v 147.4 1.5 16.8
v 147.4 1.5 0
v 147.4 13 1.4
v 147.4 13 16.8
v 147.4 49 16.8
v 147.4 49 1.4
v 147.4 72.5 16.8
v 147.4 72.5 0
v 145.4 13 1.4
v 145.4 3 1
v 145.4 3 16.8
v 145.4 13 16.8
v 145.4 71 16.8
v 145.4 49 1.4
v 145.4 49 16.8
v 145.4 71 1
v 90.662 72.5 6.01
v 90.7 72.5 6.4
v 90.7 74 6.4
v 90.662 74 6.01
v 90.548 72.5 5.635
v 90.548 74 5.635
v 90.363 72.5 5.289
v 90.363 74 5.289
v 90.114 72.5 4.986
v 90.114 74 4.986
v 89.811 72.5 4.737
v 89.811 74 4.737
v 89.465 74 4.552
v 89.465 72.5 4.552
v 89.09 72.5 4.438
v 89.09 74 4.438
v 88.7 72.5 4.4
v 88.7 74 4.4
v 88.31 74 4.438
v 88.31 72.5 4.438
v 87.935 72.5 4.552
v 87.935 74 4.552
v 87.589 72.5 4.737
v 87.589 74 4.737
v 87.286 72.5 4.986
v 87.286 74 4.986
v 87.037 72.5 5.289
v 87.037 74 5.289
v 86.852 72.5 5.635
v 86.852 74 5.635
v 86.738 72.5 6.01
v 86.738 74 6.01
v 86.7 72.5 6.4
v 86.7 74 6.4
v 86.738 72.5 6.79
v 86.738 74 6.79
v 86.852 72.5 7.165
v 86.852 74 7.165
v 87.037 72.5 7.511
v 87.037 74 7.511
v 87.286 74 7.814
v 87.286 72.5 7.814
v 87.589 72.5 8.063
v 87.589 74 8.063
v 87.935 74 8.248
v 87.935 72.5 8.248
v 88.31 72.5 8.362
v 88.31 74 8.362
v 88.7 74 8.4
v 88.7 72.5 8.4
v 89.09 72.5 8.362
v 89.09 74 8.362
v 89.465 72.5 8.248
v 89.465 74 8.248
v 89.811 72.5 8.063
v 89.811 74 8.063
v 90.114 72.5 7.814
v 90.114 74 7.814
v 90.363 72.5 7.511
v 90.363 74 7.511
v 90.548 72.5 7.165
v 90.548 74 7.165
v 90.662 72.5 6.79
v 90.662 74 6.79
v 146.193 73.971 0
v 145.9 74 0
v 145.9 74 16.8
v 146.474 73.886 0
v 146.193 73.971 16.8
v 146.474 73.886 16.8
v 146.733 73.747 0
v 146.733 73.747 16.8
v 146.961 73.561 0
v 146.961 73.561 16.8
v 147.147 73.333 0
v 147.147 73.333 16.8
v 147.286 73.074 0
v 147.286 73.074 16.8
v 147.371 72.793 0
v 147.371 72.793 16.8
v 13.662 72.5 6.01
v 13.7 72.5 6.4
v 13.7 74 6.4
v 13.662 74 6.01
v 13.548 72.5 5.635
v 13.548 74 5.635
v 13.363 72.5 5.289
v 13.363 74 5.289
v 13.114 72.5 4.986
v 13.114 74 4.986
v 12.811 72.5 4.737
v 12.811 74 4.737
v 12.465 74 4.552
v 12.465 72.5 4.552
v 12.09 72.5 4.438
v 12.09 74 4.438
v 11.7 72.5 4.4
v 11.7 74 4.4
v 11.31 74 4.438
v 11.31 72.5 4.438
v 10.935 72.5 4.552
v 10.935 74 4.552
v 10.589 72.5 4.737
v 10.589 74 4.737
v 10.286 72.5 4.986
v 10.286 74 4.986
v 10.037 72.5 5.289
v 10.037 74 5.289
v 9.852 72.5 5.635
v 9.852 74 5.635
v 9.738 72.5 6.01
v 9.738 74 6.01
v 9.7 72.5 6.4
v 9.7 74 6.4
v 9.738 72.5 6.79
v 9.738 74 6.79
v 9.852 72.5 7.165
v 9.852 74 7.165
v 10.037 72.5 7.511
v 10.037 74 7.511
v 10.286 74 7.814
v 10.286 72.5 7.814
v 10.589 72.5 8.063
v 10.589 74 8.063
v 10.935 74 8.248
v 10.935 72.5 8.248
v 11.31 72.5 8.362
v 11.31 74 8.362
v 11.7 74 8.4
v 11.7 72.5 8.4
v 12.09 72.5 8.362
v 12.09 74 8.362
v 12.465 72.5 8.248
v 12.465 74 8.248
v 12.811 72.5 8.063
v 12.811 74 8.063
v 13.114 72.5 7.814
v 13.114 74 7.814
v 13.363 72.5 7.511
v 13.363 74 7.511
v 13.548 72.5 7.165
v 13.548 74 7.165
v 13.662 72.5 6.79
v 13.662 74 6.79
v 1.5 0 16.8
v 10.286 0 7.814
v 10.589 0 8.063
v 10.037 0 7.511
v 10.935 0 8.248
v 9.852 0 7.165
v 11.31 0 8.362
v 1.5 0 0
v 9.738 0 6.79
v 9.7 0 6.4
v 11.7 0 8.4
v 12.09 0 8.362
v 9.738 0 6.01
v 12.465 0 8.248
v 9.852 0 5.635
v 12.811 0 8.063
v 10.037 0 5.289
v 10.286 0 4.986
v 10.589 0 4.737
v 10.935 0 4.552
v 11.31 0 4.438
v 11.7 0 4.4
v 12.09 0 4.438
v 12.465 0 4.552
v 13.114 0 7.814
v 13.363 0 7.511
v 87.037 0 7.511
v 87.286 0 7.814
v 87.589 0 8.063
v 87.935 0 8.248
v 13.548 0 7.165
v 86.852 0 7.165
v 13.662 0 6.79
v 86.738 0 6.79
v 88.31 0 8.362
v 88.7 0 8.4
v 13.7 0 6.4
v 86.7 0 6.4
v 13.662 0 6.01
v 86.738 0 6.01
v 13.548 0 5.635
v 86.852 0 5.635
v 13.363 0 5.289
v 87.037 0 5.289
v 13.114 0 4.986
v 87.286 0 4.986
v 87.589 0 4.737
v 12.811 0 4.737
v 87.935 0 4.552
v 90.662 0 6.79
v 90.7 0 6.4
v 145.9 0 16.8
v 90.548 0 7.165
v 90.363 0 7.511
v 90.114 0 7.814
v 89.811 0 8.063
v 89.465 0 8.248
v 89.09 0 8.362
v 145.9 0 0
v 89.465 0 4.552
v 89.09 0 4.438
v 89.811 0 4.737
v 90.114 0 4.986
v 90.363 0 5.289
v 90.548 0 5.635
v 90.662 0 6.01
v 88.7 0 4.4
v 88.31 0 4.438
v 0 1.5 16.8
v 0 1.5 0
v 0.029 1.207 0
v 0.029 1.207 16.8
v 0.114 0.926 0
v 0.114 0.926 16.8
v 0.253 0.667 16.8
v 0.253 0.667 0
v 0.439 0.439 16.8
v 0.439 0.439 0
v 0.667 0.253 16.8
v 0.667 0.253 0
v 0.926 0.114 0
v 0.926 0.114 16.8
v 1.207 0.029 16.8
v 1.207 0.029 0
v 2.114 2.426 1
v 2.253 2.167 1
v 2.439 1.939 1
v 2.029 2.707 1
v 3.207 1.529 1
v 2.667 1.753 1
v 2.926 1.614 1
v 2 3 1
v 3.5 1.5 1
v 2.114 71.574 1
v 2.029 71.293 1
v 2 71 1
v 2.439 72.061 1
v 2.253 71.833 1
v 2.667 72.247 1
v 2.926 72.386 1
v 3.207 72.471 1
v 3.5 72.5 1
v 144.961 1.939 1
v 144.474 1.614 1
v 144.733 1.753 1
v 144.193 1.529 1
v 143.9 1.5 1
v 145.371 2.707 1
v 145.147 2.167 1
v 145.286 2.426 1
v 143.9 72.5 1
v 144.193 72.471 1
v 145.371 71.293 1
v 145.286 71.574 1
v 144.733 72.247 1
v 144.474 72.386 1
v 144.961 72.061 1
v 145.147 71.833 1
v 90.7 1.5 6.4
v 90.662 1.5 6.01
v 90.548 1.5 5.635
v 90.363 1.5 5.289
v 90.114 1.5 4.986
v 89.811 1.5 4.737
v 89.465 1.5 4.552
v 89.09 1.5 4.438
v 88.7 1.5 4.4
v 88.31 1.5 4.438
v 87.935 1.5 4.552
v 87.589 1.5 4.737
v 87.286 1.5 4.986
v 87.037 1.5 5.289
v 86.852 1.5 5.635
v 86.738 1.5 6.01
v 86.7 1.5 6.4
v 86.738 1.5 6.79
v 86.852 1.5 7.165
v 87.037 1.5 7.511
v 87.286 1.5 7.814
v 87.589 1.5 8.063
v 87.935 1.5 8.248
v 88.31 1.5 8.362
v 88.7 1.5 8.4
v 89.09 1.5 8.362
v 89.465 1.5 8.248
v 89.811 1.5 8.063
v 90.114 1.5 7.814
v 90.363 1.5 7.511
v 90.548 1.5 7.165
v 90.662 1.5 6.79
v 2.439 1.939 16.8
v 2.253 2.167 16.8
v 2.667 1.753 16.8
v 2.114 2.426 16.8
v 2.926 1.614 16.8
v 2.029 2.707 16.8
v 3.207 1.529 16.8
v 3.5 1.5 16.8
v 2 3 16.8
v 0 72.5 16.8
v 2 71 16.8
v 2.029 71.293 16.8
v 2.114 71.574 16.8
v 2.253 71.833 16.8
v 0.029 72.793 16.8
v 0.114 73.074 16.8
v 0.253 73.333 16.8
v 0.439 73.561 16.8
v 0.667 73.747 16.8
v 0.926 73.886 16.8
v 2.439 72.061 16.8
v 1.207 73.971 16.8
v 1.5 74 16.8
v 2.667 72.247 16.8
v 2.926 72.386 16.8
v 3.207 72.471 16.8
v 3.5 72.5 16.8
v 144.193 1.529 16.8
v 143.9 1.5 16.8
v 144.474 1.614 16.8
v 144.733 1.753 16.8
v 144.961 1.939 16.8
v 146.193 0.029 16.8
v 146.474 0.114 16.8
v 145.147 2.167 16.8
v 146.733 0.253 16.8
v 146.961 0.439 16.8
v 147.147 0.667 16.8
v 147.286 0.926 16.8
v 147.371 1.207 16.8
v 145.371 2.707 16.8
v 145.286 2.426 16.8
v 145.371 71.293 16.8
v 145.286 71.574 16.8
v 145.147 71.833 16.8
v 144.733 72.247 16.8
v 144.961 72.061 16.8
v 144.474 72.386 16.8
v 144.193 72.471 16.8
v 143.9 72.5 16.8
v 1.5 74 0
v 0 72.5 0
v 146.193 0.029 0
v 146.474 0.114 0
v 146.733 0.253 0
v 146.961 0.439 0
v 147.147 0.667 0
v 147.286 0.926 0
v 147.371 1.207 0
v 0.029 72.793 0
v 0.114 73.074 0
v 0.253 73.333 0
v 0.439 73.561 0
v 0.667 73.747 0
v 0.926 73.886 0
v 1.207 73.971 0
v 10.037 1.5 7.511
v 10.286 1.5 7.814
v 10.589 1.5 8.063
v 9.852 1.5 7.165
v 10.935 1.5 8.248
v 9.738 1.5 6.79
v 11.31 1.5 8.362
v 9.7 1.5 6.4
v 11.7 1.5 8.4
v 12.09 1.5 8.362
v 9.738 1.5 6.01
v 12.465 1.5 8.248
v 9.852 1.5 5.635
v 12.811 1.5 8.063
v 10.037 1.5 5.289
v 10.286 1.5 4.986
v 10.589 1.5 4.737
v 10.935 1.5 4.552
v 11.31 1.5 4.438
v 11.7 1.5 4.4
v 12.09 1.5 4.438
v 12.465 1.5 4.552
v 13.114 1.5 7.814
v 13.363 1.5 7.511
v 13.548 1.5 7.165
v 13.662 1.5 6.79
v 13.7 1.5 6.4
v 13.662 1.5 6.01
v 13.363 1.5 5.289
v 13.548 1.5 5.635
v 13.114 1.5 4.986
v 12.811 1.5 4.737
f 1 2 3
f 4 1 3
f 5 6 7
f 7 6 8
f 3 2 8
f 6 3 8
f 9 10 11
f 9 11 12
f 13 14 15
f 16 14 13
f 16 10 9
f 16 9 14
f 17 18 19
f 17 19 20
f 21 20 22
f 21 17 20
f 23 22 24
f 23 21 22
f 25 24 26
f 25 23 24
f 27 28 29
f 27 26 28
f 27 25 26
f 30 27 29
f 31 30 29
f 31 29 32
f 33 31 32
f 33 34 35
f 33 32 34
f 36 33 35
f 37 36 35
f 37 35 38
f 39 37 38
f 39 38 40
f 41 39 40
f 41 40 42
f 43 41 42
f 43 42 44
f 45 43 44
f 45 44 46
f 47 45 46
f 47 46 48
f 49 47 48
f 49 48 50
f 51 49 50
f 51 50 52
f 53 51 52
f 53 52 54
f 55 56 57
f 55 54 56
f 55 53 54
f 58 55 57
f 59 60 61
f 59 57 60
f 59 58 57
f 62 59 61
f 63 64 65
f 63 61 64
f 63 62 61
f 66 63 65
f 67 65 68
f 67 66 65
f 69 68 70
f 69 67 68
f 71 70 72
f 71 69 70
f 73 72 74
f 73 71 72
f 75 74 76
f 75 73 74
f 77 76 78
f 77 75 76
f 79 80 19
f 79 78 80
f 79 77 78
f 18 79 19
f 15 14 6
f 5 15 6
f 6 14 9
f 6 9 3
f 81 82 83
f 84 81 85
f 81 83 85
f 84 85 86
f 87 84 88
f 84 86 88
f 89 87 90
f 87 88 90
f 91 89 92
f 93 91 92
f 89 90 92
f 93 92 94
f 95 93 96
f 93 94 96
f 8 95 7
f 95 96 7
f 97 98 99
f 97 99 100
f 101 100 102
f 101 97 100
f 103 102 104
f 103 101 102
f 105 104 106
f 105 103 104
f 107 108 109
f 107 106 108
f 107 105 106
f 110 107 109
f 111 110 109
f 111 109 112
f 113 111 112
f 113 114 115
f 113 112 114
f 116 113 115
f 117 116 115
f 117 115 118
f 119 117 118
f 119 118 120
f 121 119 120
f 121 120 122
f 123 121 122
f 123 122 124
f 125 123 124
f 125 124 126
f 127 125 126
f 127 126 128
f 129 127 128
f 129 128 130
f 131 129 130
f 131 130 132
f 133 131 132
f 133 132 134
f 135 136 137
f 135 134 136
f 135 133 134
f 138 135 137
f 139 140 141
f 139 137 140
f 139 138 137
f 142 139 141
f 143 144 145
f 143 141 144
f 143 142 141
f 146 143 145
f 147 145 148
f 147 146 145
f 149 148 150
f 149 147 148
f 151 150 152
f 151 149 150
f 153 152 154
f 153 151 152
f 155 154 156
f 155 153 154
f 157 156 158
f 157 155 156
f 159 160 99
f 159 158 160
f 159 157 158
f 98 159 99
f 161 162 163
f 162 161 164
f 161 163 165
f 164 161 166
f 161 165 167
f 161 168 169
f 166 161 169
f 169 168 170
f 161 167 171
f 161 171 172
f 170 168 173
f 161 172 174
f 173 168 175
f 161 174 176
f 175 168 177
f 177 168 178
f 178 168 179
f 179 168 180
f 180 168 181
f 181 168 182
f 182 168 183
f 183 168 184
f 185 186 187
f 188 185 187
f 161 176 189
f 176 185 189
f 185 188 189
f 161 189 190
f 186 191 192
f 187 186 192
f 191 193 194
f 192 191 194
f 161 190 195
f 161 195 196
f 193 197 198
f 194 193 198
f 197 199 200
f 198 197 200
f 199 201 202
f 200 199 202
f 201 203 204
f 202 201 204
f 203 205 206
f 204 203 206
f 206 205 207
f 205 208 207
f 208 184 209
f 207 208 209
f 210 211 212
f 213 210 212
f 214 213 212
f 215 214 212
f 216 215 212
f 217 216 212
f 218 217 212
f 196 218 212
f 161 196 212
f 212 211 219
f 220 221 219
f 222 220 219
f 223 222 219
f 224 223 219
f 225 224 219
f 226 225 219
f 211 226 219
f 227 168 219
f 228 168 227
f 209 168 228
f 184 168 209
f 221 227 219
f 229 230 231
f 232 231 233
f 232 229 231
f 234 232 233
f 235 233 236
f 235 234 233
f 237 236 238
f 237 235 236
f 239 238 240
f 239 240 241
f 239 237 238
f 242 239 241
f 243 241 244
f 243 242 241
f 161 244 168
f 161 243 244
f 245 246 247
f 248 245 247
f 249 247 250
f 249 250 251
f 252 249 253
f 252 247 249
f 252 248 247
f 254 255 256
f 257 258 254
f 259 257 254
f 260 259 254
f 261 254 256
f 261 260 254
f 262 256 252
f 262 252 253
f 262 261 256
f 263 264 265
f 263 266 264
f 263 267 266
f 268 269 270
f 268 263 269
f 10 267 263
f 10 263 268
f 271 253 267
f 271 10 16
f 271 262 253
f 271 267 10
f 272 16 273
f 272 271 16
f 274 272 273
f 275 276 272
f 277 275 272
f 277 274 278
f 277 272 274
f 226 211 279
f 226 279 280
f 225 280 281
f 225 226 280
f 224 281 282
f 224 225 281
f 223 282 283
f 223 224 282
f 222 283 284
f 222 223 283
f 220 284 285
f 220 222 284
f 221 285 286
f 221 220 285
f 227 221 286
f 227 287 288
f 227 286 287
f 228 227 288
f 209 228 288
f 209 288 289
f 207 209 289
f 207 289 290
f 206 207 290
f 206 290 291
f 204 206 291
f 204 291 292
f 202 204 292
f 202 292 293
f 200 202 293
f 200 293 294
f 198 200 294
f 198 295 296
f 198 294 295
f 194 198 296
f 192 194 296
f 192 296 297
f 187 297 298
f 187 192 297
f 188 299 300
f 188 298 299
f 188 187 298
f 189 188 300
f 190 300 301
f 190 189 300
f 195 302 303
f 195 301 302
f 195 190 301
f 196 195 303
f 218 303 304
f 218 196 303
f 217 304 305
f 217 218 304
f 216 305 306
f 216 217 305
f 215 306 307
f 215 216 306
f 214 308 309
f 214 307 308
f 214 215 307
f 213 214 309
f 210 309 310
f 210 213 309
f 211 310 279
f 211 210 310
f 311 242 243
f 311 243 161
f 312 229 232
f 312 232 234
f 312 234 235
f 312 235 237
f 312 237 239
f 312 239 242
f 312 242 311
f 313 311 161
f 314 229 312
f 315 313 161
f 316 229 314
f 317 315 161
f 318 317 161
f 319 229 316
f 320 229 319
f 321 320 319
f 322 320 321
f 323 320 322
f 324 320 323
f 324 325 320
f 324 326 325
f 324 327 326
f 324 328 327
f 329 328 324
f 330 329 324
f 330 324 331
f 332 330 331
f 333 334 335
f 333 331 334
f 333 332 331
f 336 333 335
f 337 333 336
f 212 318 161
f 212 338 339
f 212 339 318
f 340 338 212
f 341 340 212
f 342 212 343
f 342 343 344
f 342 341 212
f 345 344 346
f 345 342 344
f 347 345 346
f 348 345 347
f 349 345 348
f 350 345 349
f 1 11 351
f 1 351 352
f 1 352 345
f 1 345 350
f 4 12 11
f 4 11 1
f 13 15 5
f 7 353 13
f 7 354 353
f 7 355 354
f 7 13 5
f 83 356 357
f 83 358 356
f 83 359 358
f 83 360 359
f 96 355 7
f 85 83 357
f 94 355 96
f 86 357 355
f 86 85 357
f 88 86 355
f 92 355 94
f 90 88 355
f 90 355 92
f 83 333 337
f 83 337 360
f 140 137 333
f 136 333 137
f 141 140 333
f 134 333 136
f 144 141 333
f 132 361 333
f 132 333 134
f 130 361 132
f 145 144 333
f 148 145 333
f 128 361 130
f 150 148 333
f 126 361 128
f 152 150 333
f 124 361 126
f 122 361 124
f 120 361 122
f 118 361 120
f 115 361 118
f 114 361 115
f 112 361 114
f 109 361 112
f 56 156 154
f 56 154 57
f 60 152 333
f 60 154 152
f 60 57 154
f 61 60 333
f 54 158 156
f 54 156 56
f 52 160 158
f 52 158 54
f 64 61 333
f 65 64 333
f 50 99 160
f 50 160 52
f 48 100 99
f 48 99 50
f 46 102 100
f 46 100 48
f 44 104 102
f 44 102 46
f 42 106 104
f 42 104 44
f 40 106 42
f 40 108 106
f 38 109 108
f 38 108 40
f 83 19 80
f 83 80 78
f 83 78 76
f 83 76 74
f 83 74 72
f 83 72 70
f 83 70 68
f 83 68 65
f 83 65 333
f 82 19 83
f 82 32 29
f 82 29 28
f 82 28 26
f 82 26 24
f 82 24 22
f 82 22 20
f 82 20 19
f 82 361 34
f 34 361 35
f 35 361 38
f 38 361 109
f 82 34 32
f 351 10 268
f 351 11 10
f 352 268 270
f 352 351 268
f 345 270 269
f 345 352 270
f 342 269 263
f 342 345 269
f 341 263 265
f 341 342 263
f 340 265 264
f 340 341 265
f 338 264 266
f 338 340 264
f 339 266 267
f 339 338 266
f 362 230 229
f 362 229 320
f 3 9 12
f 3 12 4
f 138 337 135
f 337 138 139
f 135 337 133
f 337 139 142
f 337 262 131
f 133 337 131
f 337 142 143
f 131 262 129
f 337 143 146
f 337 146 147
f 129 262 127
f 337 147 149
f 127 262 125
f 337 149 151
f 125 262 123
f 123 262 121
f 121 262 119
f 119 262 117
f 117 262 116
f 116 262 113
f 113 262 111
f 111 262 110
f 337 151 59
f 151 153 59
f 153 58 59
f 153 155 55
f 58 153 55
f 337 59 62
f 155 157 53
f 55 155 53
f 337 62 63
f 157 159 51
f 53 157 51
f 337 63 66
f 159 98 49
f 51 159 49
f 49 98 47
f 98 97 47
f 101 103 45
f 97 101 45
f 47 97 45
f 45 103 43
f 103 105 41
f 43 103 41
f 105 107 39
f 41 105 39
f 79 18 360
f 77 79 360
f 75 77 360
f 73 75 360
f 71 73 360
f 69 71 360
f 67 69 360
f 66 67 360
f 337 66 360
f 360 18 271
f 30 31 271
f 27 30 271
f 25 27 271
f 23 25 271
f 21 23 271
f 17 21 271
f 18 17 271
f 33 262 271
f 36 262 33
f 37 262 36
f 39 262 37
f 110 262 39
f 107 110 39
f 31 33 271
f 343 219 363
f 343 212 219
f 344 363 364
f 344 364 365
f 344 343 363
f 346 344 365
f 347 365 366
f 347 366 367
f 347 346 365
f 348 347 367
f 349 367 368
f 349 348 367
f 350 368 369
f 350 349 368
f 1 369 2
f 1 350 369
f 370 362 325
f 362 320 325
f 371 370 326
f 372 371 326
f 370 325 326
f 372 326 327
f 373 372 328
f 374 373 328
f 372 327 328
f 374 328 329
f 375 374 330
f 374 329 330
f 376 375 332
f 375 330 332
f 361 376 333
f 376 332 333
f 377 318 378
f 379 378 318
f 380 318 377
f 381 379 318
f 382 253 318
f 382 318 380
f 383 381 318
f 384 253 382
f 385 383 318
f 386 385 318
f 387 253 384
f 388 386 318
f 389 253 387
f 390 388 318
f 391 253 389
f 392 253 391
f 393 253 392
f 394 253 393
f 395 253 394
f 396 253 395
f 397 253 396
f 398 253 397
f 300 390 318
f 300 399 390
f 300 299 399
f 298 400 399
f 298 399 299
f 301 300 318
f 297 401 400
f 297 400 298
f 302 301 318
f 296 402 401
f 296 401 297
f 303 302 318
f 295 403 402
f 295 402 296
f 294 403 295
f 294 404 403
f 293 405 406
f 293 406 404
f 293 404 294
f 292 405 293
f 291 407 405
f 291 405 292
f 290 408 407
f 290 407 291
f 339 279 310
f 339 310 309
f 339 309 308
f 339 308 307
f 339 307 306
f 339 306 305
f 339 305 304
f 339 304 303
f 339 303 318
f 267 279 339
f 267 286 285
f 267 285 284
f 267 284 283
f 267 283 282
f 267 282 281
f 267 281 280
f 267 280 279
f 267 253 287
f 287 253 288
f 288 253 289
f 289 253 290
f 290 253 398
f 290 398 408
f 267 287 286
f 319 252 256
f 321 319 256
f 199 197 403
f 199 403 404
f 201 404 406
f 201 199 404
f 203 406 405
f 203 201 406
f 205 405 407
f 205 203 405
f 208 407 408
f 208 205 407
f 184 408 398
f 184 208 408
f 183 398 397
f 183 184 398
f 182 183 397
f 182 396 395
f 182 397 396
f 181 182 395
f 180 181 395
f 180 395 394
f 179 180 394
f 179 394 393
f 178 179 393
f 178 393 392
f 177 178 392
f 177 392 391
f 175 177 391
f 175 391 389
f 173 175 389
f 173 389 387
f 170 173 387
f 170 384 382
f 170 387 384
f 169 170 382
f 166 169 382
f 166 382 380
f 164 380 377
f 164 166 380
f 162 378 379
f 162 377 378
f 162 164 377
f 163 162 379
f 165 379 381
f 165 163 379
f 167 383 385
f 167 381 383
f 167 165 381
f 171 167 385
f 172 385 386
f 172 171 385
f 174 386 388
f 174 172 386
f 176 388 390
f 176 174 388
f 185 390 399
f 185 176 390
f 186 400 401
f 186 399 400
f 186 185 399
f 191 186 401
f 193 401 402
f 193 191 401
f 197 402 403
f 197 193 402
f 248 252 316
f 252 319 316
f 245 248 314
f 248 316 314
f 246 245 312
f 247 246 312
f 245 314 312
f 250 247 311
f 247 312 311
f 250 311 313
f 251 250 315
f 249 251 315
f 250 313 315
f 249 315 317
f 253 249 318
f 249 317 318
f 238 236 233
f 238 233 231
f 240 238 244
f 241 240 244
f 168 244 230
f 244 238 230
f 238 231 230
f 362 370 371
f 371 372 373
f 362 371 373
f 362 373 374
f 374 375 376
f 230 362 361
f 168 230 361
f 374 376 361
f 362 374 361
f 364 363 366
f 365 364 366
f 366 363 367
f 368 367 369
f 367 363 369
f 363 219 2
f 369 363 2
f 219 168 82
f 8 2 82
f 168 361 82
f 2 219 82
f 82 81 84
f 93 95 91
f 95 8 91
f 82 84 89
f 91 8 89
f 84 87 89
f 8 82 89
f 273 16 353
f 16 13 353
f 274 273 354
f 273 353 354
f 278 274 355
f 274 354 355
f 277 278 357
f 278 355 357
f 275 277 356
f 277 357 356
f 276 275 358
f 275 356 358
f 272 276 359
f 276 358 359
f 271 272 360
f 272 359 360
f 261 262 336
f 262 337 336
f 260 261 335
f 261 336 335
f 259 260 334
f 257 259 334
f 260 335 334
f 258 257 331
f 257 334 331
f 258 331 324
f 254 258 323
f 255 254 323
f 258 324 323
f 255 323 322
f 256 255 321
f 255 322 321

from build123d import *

# Parameters (mm, degrees)
CYLINDER_R       = 2
CYLINDER_DEPTH   = 100
ARRAY002_X_COUNT = 2
ARRAY002_X_PITCH = 77
BOX009_W         = 30
BOX009_H         = 36
BOX009_DEPTH     = 20
BOX001_W         = 143.4
BOX001_H         = 71
BOX001_DEPTH     = 17.3
BOX_W            = 147.4
BOX_H            = 74
BOX_DEPTH        = 16.8
FILLET_R         = 1.5


with BuildPart() as hdd_side_holes_clone:
    # Cylinder → Cylinder (new body)
    with BuildSketch(Plane(origin=(9.5, -16, 3.5), x_dir=(1, 0, 0), z_dir=(0, 1, 0))):
        Circle(CYLINDER_R)
    extrude(amount=CYLINDER_DEPTH)

    # Array002 X: hdd side holes clone ×2


with BuildPart() as hdd_side_holes_clone_1:
    add(hdd_side_holes_clone.part)
    with Locations(*[(i * ARRAY002_X_PITCH, 0, 0) for i in range(1, ARRAY002_X_COUNT)]):
        add(hdd_side_holes_clone.part)


with BuildPart() as hdd_side_holes_clone_2:
    # Body placement: moved
    add(hdd_side_holes_clone_1.part.moved(Location((2.2, 0, 2.9))))


with BuildPart() as usb_extent_hole:
    # Box009 → Box009 (new body)
    with BuildSketch(Plane(origin=(131, 13, 1.4), x_dir=(1, 0, 0), z_dir=(0, 0, 1))):
        with Locations((15, 18)):
            Rectangle(BOX009_W, BOX009_H)
    extrude(amount=BOX009_DEPTH)


with BuildPart() as bottom_body_hole_fusion:
    # Box001 → Box001 (new body)
    with BuildSketch(Plane(origin=(2, 1.5, 1), x_dir=(1, 0, 0), z_dir=(0, 0, 1))):
        with Locations((71.7, 35.5)):
            Rectangle(BOX001_W, BOX001_H)
    extrude(amount=BOX001_DEPTH)

    # Fusion: union hdd side holes clone, usb extent hole
    add(hdd_side_holes_clone_2.part)
    add(usb_extent_hole.part)


with BuildPart() as bottom_fillet:
    # Box → Box (new body)
    with BuildSketch(Plane.XY):
        with Locations((73.7, 37)):
            Rectangle(BOX_W, BOX_H)
    extrude(amount=BOX_DEPTH)

    # Cut: cut bottom body hole fusion
    add(bottom_body_hole_fusion.part, mode=Mode.SUBTRACT)

    # Fillet
    fillet_edges = [bottom_fillet.edges().sort_by_distance(p)[0] for p in [
        (0, 0, 8.4),
        (0, 74, 8.4),
        (147.4, 0, 8.4),
        (147.4, 74, 8.4),
        (145.4, 72.5, 8.9),
        (145.4, 1.5, 8.9),
        (2, 72.5, 8.9),
        (2, 1.5, 8.9),
    ]]
    fillet(fillet_edges, radius=FILLET_R)


solid = bottom_fillet.part
